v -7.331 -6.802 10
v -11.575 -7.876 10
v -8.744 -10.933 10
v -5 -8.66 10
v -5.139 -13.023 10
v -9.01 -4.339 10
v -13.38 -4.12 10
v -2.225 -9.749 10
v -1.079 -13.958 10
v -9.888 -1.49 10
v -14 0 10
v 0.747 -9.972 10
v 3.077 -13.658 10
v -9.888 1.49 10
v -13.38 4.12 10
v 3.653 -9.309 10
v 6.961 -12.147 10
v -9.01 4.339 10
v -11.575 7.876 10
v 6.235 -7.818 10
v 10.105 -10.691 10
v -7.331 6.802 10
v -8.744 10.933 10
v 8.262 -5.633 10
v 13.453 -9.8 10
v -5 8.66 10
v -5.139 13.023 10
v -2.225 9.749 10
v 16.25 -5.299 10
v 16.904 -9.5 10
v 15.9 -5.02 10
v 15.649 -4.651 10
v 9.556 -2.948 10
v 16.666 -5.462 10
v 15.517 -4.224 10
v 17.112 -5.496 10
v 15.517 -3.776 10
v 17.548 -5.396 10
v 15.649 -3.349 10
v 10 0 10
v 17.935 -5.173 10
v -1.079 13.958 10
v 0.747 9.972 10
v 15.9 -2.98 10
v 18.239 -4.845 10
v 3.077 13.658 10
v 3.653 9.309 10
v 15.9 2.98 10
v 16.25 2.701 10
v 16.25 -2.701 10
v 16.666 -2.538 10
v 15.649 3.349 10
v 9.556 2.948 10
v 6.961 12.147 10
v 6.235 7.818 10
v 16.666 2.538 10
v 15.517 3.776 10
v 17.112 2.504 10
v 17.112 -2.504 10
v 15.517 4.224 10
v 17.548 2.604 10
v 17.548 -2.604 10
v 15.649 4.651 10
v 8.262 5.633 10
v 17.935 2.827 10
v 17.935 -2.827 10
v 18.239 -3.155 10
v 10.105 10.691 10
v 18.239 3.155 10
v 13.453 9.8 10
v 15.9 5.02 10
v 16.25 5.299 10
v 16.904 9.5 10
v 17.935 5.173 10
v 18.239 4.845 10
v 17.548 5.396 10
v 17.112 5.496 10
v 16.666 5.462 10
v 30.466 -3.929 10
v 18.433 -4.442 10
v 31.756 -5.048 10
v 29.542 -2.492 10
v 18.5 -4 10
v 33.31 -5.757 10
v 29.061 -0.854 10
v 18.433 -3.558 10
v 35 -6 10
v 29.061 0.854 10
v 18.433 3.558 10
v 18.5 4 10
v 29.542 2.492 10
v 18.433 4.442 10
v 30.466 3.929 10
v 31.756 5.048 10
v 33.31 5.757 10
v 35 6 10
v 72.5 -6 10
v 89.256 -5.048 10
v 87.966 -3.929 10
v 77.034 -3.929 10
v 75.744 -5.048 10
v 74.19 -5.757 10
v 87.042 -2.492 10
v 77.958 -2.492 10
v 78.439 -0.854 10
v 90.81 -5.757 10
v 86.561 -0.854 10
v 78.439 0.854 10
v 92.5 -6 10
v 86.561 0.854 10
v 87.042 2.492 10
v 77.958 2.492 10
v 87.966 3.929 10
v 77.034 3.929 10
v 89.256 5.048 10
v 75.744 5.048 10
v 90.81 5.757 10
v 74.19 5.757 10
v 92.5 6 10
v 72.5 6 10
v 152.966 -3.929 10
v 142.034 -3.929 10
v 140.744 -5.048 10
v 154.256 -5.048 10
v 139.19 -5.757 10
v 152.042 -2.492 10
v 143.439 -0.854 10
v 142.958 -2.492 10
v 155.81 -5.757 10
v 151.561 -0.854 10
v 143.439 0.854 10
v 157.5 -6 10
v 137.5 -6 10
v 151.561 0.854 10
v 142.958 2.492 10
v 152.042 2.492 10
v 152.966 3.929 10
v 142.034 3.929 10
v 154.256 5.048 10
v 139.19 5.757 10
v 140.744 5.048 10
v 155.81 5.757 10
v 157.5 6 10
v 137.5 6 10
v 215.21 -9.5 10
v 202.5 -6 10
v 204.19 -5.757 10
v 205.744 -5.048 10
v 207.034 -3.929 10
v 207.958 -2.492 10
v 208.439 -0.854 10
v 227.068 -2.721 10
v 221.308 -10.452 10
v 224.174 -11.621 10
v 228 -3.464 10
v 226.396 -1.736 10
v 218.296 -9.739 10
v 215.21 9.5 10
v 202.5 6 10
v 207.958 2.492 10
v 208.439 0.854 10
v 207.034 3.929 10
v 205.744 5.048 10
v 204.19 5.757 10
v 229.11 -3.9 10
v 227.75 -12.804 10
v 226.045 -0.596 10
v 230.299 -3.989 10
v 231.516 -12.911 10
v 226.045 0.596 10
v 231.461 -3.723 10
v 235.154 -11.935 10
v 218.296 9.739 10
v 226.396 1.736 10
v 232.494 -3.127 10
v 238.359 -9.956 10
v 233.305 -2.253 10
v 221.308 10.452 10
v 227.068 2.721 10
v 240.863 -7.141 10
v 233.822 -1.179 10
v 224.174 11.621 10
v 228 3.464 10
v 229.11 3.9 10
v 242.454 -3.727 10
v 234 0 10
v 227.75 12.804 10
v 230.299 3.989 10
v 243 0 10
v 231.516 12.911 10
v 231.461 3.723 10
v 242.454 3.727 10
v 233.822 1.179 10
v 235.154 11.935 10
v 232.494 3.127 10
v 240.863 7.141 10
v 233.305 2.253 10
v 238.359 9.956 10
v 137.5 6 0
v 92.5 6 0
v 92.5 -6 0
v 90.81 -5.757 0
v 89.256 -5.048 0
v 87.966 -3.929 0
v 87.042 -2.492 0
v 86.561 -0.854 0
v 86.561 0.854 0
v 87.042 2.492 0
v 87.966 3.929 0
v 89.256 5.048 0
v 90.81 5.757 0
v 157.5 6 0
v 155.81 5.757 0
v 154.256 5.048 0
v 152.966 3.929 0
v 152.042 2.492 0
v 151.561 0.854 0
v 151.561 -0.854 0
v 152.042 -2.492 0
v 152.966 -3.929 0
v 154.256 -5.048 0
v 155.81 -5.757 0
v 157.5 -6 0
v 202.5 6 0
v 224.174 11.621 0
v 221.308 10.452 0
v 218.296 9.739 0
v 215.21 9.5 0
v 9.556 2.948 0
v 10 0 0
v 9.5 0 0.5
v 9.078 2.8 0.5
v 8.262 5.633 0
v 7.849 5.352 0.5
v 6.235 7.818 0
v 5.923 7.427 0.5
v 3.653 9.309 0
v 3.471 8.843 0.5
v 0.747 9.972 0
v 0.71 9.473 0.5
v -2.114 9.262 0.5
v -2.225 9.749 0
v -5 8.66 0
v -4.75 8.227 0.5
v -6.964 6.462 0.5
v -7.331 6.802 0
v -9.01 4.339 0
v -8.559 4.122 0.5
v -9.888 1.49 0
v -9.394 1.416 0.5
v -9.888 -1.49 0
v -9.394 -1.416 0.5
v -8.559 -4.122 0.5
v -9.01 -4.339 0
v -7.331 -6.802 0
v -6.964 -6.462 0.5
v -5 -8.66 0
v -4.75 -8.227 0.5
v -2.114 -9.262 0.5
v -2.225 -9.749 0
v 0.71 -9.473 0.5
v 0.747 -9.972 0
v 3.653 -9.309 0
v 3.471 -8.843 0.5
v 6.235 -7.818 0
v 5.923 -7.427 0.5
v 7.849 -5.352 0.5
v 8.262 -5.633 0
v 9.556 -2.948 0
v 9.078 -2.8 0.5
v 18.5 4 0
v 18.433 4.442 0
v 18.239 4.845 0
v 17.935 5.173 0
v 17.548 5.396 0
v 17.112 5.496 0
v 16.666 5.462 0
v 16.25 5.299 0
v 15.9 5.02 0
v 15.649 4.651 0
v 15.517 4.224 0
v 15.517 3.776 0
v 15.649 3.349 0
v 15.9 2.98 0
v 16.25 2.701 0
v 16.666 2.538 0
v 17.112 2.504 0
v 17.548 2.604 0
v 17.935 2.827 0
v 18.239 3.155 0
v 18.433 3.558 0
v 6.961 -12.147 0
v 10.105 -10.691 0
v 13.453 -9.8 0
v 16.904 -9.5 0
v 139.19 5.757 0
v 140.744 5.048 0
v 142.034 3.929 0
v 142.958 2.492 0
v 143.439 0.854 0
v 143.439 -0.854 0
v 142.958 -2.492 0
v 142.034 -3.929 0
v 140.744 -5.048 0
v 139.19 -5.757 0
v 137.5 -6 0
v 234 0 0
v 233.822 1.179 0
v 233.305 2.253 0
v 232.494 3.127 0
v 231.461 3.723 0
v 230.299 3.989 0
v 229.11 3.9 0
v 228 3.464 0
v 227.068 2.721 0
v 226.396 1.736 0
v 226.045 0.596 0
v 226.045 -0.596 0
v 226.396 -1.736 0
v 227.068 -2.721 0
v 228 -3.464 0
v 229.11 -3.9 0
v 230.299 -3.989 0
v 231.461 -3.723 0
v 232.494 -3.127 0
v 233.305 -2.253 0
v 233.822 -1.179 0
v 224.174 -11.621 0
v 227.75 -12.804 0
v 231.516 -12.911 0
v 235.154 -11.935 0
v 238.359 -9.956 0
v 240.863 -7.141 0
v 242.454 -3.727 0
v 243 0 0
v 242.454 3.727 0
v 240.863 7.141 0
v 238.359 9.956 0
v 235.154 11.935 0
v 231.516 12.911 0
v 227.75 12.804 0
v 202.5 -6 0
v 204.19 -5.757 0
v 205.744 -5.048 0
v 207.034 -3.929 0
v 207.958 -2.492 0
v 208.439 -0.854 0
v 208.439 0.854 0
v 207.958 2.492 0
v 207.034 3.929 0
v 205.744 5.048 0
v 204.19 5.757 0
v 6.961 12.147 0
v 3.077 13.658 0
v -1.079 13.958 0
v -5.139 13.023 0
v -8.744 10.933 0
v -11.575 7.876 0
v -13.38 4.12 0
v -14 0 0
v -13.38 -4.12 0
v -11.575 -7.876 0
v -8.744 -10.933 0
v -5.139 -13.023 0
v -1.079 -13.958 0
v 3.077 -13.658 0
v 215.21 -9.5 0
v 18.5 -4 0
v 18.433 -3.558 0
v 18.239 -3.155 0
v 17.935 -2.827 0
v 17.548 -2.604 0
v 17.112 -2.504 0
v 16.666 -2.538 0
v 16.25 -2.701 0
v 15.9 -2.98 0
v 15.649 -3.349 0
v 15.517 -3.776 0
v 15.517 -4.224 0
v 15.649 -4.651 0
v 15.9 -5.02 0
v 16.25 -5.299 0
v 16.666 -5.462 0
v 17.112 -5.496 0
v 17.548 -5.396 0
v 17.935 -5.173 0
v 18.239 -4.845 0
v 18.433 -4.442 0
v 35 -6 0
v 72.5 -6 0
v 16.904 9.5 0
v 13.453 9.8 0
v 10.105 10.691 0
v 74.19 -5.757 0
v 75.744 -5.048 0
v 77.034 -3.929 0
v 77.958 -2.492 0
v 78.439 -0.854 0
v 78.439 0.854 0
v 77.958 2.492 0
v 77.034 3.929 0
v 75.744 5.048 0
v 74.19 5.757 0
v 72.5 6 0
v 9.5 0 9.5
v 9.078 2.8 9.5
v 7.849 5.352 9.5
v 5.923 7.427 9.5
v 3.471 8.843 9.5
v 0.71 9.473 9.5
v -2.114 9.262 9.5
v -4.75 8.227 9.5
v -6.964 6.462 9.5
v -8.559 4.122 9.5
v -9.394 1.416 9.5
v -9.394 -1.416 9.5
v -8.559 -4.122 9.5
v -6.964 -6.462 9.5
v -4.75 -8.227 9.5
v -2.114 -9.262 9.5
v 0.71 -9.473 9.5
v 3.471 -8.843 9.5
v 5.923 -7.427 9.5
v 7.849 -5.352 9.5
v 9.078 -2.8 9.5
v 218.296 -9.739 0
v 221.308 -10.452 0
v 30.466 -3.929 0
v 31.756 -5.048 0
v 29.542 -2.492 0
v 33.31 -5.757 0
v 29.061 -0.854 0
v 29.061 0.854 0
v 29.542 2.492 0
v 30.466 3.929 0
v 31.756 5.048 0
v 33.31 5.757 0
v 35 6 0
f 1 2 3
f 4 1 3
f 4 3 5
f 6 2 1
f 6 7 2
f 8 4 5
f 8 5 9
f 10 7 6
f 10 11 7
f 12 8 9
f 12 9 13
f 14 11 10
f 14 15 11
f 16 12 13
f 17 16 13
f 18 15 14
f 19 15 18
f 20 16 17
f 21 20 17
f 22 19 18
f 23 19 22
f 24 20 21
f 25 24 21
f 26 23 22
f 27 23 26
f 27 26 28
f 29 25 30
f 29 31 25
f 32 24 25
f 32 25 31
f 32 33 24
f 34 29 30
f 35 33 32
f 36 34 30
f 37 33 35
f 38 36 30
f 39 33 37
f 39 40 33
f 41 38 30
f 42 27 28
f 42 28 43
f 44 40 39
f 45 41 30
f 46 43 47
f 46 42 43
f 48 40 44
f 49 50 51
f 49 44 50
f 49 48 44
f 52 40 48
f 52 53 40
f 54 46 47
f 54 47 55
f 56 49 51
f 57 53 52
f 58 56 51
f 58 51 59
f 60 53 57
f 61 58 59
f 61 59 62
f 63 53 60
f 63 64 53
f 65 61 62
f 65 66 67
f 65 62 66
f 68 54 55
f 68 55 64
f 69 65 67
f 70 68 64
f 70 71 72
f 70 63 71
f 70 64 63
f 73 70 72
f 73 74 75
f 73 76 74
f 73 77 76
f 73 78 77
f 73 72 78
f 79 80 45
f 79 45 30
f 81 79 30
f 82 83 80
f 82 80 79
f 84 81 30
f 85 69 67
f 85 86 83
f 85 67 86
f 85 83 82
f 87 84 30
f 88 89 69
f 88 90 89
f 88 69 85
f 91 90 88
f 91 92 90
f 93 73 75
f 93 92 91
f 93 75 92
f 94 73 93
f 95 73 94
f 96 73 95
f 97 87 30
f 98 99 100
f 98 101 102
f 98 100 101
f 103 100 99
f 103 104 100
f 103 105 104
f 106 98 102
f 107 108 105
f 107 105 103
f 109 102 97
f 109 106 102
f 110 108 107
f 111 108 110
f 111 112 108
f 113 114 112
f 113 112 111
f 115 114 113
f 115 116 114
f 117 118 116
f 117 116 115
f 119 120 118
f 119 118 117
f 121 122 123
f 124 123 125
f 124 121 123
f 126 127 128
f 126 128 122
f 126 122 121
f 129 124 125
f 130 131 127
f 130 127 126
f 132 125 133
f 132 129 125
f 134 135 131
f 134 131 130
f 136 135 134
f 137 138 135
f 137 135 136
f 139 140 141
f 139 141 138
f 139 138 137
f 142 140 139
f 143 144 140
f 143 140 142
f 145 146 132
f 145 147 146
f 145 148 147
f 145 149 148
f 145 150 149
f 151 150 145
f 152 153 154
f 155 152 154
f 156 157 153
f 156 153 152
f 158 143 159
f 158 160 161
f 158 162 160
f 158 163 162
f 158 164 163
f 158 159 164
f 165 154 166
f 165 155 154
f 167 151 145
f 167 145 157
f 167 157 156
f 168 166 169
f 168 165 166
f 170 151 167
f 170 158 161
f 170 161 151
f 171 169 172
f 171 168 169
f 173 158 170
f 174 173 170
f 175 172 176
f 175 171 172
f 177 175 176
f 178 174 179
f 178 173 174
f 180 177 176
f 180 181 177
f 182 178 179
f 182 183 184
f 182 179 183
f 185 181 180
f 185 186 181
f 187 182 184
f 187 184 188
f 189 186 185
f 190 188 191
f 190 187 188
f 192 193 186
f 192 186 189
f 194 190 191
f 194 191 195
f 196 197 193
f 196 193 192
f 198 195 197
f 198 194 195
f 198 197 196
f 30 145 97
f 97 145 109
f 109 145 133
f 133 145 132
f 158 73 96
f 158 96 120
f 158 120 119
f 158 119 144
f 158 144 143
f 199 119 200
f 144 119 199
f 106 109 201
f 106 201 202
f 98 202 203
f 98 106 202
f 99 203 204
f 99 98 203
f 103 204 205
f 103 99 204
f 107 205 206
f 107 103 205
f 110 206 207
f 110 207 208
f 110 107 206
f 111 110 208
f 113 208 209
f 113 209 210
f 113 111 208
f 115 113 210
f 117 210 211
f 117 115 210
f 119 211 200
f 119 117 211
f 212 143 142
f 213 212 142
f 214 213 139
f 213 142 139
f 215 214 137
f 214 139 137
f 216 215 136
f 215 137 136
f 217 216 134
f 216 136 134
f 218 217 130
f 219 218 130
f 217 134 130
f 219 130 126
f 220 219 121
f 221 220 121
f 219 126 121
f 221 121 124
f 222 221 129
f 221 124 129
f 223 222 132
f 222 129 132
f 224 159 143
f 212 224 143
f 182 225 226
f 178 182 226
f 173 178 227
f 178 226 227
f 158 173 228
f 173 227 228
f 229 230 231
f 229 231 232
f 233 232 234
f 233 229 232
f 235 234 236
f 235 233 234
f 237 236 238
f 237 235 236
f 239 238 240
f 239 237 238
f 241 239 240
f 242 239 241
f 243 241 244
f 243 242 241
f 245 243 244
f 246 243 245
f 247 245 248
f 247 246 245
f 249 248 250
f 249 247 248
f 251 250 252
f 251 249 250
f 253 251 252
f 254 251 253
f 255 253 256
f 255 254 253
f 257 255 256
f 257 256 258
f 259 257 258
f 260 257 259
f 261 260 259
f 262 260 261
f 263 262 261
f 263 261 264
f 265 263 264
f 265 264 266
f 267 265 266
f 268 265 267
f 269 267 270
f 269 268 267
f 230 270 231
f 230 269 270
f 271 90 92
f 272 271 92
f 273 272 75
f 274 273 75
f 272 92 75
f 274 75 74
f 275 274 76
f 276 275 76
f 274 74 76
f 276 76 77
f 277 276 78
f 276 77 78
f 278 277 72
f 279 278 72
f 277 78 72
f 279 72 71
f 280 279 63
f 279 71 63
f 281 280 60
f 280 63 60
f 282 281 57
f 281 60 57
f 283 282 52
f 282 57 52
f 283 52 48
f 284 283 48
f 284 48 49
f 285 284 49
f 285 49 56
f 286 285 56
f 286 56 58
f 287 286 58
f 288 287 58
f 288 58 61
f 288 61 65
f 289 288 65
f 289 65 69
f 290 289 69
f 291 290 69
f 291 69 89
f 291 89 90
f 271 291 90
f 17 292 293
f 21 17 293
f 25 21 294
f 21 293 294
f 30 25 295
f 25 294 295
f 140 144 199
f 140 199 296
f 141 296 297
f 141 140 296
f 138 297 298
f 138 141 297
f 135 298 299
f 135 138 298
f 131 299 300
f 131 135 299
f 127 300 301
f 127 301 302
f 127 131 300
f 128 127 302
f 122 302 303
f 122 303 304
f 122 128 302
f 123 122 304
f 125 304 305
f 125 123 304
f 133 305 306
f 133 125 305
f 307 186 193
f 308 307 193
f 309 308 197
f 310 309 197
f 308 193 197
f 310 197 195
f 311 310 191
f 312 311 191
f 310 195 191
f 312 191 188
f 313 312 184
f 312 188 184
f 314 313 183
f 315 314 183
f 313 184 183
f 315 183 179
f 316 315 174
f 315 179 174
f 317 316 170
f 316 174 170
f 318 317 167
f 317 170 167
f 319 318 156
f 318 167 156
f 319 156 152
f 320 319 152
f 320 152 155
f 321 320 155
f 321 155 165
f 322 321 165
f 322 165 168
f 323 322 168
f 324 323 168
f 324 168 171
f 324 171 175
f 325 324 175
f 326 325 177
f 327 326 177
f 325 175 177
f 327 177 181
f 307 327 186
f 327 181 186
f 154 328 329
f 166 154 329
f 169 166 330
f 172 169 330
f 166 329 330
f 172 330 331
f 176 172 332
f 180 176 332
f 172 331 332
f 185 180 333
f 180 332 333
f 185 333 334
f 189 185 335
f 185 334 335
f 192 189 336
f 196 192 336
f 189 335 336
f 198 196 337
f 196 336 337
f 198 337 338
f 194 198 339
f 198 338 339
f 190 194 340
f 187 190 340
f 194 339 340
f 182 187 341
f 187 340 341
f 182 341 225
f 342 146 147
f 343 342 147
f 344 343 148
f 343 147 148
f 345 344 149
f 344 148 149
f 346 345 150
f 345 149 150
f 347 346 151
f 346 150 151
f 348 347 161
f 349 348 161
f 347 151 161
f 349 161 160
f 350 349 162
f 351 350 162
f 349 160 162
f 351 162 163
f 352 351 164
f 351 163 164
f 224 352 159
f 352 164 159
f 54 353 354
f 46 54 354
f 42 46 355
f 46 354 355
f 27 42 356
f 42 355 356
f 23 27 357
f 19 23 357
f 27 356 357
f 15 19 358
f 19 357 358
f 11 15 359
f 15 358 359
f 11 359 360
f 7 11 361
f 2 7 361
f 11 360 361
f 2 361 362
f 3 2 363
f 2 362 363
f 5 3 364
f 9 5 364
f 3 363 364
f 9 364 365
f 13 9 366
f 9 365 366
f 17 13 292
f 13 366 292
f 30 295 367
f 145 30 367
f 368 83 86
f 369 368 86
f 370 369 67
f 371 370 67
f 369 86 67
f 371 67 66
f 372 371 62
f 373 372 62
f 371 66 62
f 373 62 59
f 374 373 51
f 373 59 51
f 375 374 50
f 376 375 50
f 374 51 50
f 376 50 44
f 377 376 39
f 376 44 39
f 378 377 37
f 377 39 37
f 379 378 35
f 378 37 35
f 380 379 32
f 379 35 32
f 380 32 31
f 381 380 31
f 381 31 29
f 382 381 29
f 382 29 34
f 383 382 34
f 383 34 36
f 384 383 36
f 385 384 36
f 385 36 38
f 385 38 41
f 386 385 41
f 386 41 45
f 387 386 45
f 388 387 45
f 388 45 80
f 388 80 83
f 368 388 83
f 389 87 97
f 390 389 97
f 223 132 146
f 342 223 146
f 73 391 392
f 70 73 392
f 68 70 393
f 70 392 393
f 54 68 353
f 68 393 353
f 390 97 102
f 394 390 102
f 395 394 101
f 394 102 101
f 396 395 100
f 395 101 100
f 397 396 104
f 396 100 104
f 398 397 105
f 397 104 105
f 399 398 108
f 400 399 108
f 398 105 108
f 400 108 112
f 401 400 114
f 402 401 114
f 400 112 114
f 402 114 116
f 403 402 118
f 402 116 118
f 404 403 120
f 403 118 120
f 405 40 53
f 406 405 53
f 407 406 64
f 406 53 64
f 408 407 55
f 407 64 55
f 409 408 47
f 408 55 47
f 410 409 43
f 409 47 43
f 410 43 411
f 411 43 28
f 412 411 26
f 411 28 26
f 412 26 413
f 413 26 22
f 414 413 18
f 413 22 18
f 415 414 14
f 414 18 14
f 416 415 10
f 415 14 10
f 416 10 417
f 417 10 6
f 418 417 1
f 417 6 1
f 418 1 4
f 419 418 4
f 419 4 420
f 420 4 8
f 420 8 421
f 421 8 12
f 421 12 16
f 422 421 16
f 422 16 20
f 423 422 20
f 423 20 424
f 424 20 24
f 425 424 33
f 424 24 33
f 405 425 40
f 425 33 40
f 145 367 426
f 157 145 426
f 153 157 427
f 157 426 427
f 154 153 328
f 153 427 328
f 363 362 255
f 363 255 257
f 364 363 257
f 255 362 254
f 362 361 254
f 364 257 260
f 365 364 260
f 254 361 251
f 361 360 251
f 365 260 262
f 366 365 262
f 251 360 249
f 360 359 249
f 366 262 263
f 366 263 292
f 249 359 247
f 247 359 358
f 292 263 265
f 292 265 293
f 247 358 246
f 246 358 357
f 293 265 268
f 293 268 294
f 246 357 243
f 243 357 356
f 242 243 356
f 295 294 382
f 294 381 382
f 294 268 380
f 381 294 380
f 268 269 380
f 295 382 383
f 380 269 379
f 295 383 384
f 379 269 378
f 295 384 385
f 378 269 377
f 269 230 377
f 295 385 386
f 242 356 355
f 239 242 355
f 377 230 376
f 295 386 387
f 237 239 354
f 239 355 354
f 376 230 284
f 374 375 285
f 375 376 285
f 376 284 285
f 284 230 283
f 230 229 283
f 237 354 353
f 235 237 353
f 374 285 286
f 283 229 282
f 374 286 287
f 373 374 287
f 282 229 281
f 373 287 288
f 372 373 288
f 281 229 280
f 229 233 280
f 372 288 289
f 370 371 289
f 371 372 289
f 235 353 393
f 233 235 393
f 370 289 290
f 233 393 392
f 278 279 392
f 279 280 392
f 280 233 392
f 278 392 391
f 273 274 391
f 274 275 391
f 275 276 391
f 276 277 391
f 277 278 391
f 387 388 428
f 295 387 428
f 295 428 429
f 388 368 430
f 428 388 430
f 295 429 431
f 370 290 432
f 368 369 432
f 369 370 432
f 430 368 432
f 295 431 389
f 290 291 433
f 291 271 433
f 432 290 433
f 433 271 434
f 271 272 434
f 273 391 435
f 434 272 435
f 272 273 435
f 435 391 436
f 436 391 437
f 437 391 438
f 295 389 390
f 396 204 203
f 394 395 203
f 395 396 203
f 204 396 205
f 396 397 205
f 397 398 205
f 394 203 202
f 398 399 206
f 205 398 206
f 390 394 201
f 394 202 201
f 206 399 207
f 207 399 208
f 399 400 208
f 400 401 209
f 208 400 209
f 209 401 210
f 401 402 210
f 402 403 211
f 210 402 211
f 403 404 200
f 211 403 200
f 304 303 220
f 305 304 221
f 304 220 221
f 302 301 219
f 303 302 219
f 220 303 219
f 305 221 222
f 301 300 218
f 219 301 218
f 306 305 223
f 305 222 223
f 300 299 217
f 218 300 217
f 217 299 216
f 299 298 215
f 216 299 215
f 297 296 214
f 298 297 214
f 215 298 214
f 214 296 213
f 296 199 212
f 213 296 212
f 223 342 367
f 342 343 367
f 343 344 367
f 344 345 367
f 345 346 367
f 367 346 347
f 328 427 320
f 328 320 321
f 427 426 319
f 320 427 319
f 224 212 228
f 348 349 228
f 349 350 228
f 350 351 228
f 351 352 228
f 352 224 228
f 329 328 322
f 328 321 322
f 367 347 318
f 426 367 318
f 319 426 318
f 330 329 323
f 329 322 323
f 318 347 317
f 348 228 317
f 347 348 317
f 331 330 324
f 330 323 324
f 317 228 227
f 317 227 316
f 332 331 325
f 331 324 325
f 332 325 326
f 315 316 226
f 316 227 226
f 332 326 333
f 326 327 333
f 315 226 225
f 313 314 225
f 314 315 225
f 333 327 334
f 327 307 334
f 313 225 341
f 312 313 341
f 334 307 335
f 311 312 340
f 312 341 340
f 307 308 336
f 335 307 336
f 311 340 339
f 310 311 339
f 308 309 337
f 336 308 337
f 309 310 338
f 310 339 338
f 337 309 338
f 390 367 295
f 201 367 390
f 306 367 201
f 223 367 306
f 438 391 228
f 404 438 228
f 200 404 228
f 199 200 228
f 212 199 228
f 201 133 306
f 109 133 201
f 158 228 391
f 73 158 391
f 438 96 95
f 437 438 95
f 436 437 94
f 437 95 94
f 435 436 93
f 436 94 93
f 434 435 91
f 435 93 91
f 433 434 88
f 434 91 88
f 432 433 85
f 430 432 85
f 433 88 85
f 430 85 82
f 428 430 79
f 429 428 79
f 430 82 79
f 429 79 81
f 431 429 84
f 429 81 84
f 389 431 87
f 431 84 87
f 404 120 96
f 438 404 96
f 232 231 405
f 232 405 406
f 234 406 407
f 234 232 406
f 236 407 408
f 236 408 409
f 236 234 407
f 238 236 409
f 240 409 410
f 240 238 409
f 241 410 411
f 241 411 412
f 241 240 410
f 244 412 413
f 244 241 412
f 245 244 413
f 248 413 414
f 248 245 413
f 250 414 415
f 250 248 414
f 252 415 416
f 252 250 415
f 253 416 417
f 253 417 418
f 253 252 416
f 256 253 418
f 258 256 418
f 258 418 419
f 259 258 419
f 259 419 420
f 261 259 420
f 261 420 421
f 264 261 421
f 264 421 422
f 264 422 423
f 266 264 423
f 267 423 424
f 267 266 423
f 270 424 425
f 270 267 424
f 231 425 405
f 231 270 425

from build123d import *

# Parameters (mm, degrees)
SKETCH_1_R          = 9.5
EXTRUDE_1_DEPTH     = 10
CHAMFER_1_SIZE      = 0.5
CUT_EXTRUDE_2_DEPTH = 10
EXTRUDE_START       = -10
SKETCH_3_R          = 9.5
SKETCH_3_R_2        = 4
EXTRUDE_2_DEPTH     = 10
SKETCH_4_R          = 6
CUT_EXTRUDE_3_DEPTH = 10
SKETCH_5_R          = 6
SKETCH_5_R_2        = 4
EXTRUDE_3_DEPTH     = 10
SKETCH_6_R          = 1.5
CUT_EXTRUDE_4_DEPTH = 244.608292141


with BuildPart() as part:
    # 草图1 → 凸台-拉伸1 (new body)
    with BuildSketch(Plane.XY):
        with BuildLine():
            Line((16.904141504, -9.5), (212.802616478, -9.5))
            Line((212.802616478, -9.5), (215.209800542, -9.5))
            ThreePointArc((215.209800542, -9.5), (219.815462407, -10.037526396), (224.173557789, -11.621212121))
            ThreePointArc((224.173557789, -11.621212121), (243, 0), (224.173557789, 11.621212121))
            ThreePointArc((224.173557789, 11.621212121), (219.815462407, 10.037526396), (215.209800542, 9.5))
            Line((215.209800542, 9.5), (212.802616478, 9.5))
            Line((212.802616478, 9.5), (16.904141504, 9.5))
            ThreePointArc((16.904141504, 9.5), (11.75918395, 10.173090993), (6.960528855, 12.147058824))
            ThreePointArc((6.960528855, 12.147058824), (-14, 0), (6.960528855, -12.147058824))
            ThreePointArc((6.960528855, -12.147058824), (11.75918395, -10.173090993), (16.904141504, -9.5))
        make_face()
        Circle(SKETCH_1_R, mode=Mode.SUBTRACT)
        with Locations((230, 0)):
            Circle(SKETCH_1_R, mode=Mode.SUBTRACT)
    extrude(amount=EXTRUDE_1_DEPTH)

    # 倒角1
    chamfer_1_edges = [part.edges().sort_by_distance(p)[0] for p in [
        (-9.5, 0, 0),
        (-9.5, 0, 10),
    ]]
    chamfer(chamfer_1_edges, length=CHAMFER_1_SIZE)

    # 草图2 → 切除-拉伸2 (cut)
    with BuildSketch(Plane.XY.offset(10)):
        with BuildLine():
            Line((137.499999918, -6), (92.5, -6))
            ThreePointArc((92.5, -6), (86.5, 0), (92.5, 6))
            Line((92.5, 6), (137.499999918, 6))
            ThreePointArc((137.499999918, 6), (143.499999918, 0), (137.499999918, -6))
        make_face()
        with BuildLine():
            Line((35, -6), (72.5, -6))
            ThreePointArc((72.5, -6), (78.5, 0), (72.5, 6))
            Line((72.5, 6), (35, 6))
            ThreePointArc((35, 6), (29, 0), (35, -6))
        make_face()
        with BuildLine():
            Line((157.5, -6), (202.5, -6))
            ThreePointArc((202.5, -6), (208.5, 0), (202.5, 6))
            Line((202.5, 6), (157.5, 6))
            ThreePointArc((157.5, 6), (151.5, 0), (157.5, -6))
        make_face()
    extrude(amount=-CUT_EXTRUDE_2_DEPTH, mode=Mode.SUBTRACT)

    # 草图3 → 凸台-拉伸2 (add)
    with BuildSketch(Plane.XY.offset(10).offset(EXTRUDE_START)):
        with Locations((230, 0)):
            Circle(SKETCH_3_R)
        with Locations((230, 0)):
            Circle(SKETCH_3_R_2, mode=Mode.SUBTRACT)
    extrude(amount=EXTRUDE_2_DEPTH)

    # 草图4 → 切除-拉伸3 (cut)
    with BuildSketch(Plane.XY.offset(10)):
        with Locations((230, 0)):
            Circle(SKETCH_4_R)
    extrude(amount=-CUT_EXTRUDE_3_DEPTH, mode=Mode.SUBTRACT)

    # 草图5 → 凸台-拉伸3 (add)
    with BuildSketch(Plane.XY.offset(10)):
        with Locations((230, 0)):
            Circle(SKETCH_5_R)
        with Locations((230, 0)):
            Circle(SKETCH_5_R_2, mode=Mode.SUBTRACT)
    extrude(amount=-EXTRUDE_3_DEPTH)

    # 草图6 → 切除-拉伸4 (cut, through all)
    with BuildSketch(Plane.XY.offset(10)):
        with Locations((17, 4)):
            Circle(SKETCH_6_R)
        with Locations((17, -4)):
            Circle(SKETCH_6_R)
    extrude(amount=-CUT_EXTRUDE_4_DEPTH, mode=Mode.SUBTRACT)


solid = part.part
